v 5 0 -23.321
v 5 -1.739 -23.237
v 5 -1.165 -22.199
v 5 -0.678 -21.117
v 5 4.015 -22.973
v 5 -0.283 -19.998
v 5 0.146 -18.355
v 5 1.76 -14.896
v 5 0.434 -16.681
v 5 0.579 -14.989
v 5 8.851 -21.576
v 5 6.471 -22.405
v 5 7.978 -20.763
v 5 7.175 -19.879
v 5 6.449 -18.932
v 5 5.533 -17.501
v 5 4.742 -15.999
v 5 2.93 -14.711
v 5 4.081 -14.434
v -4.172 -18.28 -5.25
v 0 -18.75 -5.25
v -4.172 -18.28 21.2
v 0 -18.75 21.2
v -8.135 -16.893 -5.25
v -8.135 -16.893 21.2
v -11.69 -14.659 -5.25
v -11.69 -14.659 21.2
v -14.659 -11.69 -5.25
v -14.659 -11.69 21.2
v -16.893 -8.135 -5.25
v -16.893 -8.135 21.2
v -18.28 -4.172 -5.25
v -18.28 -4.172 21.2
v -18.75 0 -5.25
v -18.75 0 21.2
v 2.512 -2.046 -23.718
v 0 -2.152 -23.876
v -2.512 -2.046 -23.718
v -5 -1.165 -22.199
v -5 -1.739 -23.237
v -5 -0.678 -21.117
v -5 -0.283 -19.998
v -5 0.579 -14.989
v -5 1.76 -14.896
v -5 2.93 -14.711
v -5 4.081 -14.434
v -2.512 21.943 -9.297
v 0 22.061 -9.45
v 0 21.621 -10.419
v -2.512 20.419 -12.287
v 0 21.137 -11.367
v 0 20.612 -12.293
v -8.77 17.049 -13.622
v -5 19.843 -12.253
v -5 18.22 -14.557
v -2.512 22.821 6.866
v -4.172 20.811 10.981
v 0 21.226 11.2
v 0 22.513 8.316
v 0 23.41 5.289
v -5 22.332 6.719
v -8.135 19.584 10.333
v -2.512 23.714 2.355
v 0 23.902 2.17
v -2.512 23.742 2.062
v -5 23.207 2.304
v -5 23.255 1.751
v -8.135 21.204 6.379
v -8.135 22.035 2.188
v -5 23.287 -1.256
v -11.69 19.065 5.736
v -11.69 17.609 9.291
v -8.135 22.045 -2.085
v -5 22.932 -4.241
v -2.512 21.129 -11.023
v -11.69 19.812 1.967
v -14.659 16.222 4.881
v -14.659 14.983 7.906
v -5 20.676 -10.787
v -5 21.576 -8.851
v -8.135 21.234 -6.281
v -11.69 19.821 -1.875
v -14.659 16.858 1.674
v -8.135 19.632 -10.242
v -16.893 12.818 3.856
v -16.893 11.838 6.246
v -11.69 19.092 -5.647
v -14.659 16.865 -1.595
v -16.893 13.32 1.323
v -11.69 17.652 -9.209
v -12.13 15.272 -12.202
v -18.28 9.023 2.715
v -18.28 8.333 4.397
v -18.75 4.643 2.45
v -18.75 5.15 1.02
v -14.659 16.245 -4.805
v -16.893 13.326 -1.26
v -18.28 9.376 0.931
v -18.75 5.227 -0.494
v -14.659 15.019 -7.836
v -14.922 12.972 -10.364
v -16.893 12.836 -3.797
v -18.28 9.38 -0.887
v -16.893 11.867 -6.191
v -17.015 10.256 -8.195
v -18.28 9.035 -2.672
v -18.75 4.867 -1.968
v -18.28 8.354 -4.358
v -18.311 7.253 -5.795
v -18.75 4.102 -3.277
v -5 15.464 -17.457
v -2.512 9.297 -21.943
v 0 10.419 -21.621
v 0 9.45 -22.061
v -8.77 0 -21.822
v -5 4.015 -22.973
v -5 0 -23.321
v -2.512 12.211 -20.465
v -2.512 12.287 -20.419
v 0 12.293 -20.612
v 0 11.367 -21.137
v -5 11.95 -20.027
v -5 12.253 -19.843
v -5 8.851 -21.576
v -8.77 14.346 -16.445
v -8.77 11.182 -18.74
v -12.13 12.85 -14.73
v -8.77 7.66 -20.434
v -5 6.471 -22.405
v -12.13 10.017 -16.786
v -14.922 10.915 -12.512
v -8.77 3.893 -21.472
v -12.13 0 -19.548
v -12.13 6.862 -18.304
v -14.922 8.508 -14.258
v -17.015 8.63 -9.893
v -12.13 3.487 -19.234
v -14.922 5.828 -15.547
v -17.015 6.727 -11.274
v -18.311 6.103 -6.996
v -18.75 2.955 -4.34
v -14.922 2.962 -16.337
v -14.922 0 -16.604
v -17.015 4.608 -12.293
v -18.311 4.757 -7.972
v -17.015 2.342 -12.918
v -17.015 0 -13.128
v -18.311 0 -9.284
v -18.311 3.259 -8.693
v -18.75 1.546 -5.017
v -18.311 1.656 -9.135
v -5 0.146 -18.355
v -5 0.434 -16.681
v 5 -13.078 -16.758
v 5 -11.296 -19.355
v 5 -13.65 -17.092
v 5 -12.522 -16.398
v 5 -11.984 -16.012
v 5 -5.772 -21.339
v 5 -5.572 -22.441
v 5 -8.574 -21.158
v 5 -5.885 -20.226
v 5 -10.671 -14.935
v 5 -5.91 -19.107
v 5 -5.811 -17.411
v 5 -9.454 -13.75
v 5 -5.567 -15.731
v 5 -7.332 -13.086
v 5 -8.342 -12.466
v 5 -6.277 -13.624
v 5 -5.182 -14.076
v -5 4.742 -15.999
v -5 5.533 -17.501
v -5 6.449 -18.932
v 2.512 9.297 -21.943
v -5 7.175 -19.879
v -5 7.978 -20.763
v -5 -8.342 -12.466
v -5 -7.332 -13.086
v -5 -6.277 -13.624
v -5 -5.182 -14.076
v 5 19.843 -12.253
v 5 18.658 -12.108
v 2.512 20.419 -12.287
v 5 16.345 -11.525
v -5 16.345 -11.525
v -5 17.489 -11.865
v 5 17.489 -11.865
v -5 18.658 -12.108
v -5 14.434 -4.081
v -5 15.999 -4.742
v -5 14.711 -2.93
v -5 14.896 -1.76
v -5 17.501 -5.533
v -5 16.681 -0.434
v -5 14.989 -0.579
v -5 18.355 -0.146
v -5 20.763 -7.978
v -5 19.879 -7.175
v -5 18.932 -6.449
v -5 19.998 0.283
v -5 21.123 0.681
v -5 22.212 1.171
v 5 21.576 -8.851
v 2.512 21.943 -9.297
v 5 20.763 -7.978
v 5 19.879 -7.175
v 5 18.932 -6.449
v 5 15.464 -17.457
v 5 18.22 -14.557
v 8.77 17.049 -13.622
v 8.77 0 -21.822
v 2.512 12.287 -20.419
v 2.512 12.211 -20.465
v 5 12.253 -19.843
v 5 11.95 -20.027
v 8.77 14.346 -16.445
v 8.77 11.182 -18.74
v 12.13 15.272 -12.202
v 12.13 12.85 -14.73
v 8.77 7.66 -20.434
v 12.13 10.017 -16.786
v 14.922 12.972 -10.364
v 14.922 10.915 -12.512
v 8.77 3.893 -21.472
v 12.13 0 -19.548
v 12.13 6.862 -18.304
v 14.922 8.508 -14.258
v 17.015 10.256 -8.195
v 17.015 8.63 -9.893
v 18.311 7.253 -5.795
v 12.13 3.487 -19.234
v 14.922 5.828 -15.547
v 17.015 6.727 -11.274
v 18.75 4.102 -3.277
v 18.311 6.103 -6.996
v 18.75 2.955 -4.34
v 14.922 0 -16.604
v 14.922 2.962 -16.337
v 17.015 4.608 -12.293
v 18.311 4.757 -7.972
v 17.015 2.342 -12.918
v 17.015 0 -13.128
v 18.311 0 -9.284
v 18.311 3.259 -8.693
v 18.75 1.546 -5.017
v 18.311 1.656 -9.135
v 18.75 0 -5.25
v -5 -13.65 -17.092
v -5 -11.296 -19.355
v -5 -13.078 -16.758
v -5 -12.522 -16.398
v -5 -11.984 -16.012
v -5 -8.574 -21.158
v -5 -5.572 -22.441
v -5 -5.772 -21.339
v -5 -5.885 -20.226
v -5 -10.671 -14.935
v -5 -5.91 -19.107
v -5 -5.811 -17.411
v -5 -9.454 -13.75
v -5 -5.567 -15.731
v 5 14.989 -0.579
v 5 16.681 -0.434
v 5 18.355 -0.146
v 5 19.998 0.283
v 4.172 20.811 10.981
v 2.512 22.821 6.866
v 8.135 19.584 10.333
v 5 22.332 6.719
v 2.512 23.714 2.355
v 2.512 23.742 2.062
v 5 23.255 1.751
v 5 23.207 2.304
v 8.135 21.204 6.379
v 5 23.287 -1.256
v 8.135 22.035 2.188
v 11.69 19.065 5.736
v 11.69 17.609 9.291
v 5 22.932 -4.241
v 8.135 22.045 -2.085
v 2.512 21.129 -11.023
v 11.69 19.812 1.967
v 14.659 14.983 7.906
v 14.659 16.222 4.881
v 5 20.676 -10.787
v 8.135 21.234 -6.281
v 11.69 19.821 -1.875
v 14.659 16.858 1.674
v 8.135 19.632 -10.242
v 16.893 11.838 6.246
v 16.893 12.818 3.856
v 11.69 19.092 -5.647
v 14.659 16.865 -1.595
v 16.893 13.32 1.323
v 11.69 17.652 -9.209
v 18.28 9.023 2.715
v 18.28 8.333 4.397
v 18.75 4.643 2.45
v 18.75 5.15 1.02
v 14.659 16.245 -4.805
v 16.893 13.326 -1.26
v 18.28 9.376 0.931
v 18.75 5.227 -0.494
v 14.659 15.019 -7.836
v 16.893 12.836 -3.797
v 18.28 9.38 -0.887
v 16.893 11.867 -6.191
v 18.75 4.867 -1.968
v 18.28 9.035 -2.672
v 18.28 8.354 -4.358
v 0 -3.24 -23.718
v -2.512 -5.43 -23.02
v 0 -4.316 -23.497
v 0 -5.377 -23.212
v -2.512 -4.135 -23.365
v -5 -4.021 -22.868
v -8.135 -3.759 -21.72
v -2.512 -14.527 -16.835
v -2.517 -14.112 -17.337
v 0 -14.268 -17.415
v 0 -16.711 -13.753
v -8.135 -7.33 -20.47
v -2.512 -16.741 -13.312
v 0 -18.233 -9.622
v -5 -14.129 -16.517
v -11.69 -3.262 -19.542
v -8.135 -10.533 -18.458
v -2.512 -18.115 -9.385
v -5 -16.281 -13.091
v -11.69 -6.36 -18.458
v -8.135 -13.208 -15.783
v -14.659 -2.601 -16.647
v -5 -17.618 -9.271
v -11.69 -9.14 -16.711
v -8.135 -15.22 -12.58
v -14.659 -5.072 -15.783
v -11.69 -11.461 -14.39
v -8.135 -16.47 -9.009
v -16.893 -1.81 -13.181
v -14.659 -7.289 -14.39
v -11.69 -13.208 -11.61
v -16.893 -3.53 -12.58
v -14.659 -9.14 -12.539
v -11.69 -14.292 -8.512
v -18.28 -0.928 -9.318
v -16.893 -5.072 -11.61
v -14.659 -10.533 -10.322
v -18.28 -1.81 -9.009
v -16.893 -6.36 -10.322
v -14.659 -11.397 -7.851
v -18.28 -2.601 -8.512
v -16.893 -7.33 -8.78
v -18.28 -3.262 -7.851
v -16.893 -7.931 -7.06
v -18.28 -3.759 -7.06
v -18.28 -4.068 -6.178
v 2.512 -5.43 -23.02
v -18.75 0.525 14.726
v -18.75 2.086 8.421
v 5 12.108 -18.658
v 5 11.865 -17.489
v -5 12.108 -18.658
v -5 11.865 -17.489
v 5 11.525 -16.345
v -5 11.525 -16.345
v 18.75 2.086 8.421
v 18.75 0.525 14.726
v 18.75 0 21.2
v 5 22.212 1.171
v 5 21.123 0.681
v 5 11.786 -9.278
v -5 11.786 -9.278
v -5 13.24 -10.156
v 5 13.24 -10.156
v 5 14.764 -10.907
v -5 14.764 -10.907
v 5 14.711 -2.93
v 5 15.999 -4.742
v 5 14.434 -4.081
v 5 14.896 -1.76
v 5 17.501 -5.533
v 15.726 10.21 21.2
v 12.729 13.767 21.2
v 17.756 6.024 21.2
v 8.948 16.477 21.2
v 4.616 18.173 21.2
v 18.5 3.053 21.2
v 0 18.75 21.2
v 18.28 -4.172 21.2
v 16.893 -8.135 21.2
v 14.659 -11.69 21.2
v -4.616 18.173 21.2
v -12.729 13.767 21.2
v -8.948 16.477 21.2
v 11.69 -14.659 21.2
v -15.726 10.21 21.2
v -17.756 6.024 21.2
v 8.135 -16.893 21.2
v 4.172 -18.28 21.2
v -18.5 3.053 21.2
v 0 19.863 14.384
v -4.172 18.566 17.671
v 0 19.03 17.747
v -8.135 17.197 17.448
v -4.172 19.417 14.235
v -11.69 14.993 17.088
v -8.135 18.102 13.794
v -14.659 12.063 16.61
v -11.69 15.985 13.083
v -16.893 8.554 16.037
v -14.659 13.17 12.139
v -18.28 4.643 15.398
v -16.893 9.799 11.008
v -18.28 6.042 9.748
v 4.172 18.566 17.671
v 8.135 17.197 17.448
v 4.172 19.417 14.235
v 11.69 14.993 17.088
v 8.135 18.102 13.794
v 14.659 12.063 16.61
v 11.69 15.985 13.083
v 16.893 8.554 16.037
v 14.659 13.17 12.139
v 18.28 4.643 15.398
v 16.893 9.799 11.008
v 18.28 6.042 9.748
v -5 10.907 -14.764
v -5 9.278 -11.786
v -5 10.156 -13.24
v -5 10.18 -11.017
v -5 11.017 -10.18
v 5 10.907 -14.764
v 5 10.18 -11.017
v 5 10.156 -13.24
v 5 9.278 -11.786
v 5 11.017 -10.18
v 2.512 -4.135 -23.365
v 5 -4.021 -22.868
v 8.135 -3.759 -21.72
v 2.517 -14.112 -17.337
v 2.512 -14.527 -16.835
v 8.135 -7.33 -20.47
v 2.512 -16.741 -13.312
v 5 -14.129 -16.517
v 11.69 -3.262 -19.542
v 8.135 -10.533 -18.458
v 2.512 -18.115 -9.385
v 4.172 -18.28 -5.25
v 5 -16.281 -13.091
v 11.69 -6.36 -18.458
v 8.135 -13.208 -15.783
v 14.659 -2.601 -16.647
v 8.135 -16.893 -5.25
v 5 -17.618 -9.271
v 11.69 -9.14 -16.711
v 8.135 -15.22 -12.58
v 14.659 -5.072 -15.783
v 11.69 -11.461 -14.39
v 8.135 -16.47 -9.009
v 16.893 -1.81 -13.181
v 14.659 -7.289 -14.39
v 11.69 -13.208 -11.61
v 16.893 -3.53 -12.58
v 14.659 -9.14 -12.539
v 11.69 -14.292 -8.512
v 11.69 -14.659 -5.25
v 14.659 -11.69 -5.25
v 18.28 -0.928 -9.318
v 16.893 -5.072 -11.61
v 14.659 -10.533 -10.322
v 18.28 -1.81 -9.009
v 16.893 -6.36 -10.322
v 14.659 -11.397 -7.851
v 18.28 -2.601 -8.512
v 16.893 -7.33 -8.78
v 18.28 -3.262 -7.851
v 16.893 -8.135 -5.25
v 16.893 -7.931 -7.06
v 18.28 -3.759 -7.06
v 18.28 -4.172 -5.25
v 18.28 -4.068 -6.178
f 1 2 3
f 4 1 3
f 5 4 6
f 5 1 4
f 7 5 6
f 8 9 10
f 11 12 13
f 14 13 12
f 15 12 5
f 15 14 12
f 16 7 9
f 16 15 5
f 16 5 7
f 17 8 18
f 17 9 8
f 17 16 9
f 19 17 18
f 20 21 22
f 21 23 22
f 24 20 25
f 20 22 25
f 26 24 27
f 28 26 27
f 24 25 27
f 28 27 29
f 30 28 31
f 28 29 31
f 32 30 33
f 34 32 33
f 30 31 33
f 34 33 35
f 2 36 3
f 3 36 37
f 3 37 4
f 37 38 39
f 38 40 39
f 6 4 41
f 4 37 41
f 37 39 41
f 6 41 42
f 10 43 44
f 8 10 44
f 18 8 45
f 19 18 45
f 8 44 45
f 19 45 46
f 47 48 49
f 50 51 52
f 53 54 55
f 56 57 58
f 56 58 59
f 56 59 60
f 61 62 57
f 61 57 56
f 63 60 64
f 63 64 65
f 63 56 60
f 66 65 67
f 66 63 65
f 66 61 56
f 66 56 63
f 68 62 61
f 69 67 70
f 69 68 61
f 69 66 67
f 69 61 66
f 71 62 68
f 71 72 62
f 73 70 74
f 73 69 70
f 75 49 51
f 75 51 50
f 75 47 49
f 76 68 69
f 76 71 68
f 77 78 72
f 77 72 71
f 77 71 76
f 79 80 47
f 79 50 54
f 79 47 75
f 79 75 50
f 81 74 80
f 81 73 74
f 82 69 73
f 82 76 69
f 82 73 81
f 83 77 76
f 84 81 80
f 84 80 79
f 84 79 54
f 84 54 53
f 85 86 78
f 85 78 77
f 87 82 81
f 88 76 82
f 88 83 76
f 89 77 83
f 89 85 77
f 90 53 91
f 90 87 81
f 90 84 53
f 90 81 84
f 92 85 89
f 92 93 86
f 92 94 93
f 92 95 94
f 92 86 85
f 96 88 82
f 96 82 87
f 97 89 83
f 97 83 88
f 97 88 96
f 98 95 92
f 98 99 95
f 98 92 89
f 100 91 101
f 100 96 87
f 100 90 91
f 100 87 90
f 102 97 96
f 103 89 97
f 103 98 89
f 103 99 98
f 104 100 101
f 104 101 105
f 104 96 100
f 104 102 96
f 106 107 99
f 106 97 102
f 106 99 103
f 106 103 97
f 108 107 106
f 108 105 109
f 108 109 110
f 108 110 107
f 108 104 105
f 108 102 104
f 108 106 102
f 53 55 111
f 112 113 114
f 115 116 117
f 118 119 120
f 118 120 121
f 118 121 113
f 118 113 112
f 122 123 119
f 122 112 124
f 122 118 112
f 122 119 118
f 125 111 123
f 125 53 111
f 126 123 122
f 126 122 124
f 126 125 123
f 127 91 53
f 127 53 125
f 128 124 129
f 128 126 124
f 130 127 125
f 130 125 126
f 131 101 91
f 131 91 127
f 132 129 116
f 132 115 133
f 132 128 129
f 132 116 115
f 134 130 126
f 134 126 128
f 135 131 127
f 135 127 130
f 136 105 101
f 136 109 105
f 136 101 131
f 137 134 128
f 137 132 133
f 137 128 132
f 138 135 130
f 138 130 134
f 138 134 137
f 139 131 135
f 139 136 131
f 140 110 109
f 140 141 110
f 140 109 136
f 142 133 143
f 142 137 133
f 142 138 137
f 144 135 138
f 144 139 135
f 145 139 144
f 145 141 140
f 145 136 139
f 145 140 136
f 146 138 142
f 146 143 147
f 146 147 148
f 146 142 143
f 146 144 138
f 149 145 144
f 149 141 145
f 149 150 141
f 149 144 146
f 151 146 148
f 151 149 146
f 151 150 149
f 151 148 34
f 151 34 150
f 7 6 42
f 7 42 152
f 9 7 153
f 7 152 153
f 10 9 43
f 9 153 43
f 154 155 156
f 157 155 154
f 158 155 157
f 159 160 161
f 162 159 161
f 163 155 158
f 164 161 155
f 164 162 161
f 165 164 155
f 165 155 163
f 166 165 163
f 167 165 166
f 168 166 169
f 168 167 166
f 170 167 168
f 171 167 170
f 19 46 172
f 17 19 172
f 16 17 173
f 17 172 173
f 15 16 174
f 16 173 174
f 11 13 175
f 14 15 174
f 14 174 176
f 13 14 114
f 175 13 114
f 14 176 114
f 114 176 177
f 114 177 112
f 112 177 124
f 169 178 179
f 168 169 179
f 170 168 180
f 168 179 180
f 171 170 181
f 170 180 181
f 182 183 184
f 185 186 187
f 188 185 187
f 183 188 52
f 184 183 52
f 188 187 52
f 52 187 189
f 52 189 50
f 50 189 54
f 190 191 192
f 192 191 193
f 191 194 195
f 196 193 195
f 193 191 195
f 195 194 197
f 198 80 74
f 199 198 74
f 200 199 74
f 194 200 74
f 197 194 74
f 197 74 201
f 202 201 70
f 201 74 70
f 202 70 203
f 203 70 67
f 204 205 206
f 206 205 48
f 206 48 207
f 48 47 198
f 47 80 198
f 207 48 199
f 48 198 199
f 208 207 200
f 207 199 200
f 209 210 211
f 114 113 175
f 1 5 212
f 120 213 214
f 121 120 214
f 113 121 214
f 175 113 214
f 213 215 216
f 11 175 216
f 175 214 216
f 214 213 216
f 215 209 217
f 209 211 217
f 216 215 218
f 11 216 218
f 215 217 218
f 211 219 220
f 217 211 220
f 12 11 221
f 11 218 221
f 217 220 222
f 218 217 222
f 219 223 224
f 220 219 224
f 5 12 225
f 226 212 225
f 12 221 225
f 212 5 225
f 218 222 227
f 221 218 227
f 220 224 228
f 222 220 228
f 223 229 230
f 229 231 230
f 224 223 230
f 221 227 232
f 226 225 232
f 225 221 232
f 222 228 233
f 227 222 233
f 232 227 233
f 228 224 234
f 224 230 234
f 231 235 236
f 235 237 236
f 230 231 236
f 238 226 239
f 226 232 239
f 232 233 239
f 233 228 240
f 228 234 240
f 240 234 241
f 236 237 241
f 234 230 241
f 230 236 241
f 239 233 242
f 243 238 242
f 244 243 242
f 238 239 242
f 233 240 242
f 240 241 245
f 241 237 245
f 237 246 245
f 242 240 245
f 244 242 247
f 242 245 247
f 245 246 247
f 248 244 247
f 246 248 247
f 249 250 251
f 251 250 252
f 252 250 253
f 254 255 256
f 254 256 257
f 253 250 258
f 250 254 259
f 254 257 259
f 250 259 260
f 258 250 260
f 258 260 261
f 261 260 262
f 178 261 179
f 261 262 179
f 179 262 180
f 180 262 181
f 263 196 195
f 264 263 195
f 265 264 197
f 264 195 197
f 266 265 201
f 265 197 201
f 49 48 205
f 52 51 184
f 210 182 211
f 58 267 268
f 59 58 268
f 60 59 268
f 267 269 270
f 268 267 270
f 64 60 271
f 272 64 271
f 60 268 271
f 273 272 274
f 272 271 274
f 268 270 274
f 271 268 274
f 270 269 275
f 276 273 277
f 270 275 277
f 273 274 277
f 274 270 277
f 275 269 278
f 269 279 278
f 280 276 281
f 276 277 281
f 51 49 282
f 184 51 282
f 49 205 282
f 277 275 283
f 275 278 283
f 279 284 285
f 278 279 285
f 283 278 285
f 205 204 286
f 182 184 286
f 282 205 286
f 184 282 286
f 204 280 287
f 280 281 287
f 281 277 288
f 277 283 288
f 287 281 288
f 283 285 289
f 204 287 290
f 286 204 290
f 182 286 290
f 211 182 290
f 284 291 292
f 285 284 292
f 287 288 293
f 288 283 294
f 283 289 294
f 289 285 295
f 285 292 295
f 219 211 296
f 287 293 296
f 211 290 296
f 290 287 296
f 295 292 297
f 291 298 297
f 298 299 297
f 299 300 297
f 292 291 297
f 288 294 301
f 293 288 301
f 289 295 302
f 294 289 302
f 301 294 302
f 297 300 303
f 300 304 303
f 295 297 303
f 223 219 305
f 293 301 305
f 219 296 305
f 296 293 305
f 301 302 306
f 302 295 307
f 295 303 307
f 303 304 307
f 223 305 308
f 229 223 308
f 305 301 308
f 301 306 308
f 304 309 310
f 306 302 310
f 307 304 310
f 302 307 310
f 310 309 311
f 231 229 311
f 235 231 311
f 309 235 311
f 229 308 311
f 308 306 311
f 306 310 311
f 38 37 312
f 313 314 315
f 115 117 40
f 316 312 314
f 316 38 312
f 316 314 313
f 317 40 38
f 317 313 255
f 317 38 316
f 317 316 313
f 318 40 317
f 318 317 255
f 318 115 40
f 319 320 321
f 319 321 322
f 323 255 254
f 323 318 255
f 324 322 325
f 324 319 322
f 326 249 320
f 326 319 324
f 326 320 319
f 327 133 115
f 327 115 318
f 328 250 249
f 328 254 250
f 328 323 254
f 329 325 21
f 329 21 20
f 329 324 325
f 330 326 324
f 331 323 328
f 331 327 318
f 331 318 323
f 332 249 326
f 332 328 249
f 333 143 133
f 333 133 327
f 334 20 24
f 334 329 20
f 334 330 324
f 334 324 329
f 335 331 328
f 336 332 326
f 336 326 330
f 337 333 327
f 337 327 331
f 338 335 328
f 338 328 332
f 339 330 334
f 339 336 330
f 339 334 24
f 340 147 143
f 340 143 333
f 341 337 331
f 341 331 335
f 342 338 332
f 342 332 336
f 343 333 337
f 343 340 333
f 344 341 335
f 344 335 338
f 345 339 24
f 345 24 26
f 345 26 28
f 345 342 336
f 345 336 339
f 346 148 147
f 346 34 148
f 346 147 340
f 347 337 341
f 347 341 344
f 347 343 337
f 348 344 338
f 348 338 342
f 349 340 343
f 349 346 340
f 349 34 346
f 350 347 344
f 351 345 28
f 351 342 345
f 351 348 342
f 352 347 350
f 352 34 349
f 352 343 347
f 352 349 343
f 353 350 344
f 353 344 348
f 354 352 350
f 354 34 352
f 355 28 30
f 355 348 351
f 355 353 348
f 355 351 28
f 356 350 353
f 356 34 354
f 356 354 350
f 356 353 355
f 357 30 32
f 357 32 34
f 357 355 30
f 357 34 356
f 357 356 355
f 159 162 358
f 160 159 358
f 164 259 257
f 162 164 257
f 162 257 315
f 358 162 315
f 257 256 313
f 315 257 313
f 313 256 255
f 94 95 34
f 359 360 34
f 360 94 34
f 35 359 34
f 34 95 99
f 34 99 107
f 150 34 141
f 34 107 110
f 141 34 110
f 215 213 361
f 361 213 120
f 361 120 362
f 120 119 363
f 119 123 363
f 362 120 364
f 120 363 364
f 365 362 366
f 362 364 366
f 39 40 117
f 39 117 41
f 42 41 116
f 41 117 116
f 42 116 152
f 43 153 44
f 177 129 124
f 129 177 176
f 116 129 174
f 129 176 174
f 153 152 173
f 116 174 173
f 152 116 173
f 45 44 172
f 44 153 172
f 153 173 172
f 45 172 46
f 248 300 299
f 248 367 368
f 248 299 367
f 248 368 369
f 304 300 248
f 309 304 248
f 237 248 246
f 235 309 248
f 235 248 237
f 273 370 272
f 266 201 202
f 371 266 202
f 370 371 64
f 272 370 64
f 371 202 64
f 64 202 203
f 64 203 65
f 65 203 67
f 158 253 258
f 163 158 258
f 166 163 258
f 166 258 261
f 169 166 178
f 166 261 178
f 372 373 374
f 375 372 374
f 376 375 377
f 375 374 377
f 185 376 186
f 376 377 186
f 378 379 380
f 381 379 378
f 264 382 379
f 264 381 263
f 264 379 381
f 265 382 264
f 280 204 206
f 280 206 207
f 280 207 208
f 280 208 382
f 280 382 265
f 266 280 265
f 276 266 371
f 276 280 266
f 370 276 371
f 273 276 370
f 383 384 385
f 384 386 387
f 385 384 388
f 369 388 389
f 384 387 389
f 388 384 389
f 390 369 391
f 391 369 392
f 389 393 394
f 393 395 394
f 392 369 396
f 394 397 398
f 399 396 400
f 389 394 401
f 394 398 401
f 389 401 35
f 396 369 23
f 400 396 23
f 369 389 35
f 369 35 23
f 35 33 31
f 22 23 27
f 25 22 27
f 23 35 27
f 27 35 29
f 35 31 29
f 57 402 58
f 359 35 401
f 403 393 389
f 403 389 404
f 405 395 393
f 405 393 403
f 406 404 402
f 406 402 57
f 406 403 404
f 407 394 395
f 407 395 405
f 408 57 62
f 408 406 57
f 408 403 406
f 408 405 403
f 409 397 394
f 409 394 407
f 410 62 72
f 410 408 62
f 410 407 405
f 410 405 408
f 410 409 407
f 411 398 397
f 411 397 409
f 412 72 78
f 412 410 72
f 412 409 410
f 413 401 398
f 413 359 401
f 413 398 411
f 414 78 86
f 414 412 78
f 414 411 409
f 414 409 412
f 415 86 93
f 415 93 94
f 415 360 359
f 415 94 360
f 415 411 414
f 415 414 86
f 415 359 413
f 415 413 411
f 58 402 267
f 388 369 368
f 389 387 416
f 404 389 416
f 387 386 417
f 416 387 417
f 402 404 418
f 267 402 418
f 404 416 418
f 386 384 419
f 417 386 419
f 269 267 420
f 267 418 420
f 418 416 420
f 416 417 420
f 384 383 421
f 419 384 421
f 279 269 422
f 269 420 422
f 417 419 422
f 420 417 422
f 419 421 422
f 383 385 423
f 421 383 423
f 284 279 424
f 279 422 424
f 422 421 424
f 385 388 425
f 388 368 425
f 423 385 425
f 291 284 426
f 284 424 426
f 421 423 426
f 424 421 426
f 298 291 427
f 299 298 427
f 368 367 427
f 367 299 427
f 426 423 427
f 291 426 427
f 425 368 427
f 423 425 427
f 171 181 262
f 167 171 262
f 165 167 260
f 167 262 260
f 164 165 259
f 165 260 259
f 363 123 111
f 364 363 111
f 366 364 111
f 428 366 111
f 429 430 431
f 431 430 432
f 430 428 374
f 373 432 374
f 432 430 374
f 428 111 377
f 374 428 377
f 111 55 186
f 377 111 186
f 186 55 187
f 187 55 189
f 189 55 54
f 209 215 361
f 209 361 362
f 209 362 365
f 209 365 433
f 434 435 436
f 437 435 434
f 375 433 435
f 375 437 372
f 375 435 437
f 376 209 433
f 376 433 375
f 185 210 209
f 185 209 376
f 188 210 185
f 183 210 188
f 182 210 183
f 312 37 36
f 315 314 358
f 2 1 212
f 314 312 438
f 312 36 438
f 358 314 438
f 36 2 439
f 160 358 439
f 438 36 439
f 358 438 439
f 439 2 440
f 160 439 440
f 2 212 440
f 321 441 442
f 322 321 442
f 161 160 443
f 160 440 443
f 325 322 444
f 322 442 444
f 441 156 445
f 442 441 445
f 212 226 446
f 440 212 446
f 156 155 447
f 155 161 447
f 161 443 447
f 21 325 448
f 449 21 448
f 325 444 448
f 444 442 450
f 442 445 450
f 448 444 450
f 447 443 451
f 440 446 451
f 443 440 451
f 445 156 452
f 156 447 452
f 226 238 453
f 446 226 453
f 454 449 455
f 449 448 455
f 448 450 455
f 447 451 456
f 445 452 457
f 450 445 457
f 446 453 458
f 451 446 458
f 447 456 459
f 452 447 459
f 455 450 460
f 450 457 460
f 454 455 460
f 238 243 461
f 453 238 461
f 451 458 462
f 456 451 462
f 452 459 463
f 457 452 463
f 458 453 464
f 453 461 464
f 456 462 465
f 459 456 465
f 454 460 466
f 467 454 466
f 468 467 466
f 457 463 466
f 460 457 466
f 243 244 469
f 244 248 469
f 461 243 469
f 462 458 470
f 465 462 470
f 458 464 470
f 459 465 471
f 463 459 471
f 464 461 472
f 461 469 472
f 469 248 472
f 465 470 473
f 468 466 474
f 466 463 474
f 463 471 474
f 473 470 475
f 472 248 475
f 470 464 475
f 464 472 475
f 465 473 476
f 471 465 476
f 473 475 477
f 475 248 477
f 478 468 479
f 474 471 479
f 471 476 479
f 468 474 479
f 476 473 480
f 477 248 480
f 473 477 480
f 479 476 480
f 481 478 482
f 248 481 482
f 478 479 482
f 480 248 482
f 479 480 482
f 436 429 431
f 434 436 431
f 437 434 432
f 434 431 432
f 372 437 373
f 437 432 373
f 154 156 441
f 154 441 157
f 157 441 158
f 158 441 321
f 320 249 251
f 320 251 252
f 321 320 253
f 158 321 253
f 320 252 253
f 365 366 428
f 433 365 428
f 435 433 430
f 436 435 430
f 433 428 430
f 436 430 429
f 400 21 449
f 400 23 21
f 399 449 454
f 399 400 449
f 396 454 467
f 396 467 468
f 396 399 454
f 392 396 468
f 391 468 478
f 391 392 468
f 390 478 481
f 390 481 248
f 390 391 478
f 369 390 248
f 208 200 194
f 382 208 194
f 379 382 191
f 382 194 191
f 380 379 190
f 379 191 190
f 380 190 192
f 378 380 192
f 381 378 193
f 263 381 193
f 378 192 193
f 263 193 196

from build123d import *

# Parameters (mm, degrees)
BOSS_EXTRUDE1_DEPTH      = 18.75
BOSS_EXTRUDE1_DEPTH_BACK = 18.75
FILLET1_R                = 18.75
CUT_EXTRUDE1_DEPTH       = 5
CUT_EXTRUDE1_DEPTH_BACK  = 5


with BuildPart() as part:
    # Sketch1 → Boss-Extrude1 (new, two sides: drawn at the far end of the back side and taken through both)
    with BuildSketch(Plane(origin=(0, 0, 0), x_dir=(0, 0, -1), z_dir=(1, 0, 0)).offset(-BOSS_EXTRUDE1_DEPTH_BACK)):
        with BuildLine():
            Line((-21.199959993, 18.75), (-21.199959993, 0))
            Line((-21.199959993, 0), (24, 0))
            ThreePointArc((24, 0), (21.628103458, 10.403131298), (14.981238267, 18.75))
            Line((14.981238267, 18.75), (-21.199959993, 18.75))
        make_face()
        with BuildLine():
            ThreePointArc((-11.199959993, 21.226419768), (-16.048924785, 19.37831648), (-21.199959993, 18.75))
            Line((-21.199959993, 18.75), (14.981238267, 18.75))
            ThreePointArc((14.981238267, 18.75), (2.260017713, 23.893353049), (-11.199959993, 21.226419768))
        make_face()
        with BuildLine():
            ThreePointArc((24, 0), (18.508252147, -13.258252147), (5.25, -18.75))
            Line((5.25, -18.75), (-21.199959993, -18.75))
            Line((-21.199959993, -18.75), (-21.199959993, 0))
            Line((-21.199959993, 0), (24, 0))
        make_face()
    extrude(amount=BOSS_EXTRUDE1_DEPTH + BOSS_EXTRUDE1_DEPTH_BACK)

    # Fillet1
    fillet1_edges = [part.edges().sort_by_distance(p)[0] for p in [
        (18.75, -18.75, 7.974979997),
        (-18.75, -18.75, 7.974979997),
        (18.75, -13.258252147, -18.508252147),
        (-18.75, -13.258252147, -18.508252147),
        (18.75, 20.552360446, -12.393566076),
        (-18.75, 20.552360446, -12.393566076),
        (18.75, 19.37831648, 16.048924785),
        (-18.75, 19.37831648, 16.048924785),
    ]]
    fillet(fillet1_edges, radius=FILLET1_R - 0.0001)  # a hair under: the kernel refuses the full size

    # Sketch2 → Cut-Extrude1 (cut, two sides: drawn at the far end of the back side and taken through both)
    with BuildSketch(Plane(origin=(0, 0, 0), x_dir=(0, 0, -1), z_dir=(1, 0, 0)).offset(-CUT_EXTRUDE1_DEPTH_BACK)):
        with BuildLine():
            ThreePointArc((6.449036598, 18.931717486), (5.121740793, 16.758420159), (4.08141286, 14.434059341))
            ThreePointArc((4.08141286, 14.434059341), (2.346516976, 14.815325109), (0.578715338, 14.988832128))
            ThreePointArc((0.578715338, 14.988832128), (0.307571672, 17.520909641), (-0.283175845, 19.997995186))
            ThreePointArc((-0.283175845, 19.997995186), (-1.077578354, 22.021879435), (-2.170046216, 23.901692397))
            ThreePointArc((-2.170046216, 23.901692397), (52.177632289, 26.585831545), (18.061354181, -15.804666563))
            ThreePointArc((18.061354181, -15.804666563), (17.182690047, -13.815915161), (16.012271373, -11.983620717))
            ThreePointArc((16.012271373, -11.983620717), (14.35549975, -10.049701585), (12.466380259, -8.34202393))
            ThreePointArc((12.466380259, -8.34202393), (13.365097847, -6.809857488), (14.076393592, -5.182194847))
            ThreePointArc((14.076393592, -5.182194847), (16.568330412, -5.706776879), (19.106729783, -5.910404133))
            ThreePointArc((19.106729783, -5.910404133), (21.277041962, -5.780297079), (23.402441464, -5.322192551))
            ThreePointArc((23.402441464, -5.322192551), (23.704520174, -3.754427161), (23.901692397, -2.170046216))
            ThreePointArc((23.901692397, -2.170046216), (22.021879435, -1.077578354), (19.997995186, -0.283175845))
            ThreePointArc((19.997995186, -0.283175845), (17.520909641, 0.307571672), (14.988832128, 0.578715338))
            ThreePointArc((14.988832128, 0.578715338), (14.815325109, 2.346516975), (14.434059341, 4.08141286))
            ThreePointArc((14.434059341, 4.08141286), (16.75842016, 5.121740793), (18.931717486, 6.449036598))
            ThreePointArc((18.931717486, 6.449036598), (20.611061914, 7.829972908), (22.061279145, 9.449865739))
            ThreePointArc((22.061279145, 9.449865739), (21.384156581, 10.895771994), (20.612396506, 12.293458028))
            ThreePointArc((20.612396506, 12.293458028), (18.449459375, 12.072356759), (16.345164544, 11.525432574))
            ThreePointArc((16.345164544, 11.525432574), (13.993927564, 10.547363003), (11.786059576, 9.278405017))
            ThreePointArc((11.786059576, 9.278405017), (10.606601718, 10.606601718), (9.278405018, 11.786059576))
            ThreePointArc((9.278405018, 11.786059576), (10.547363004, 13.993927564), (11.525432575, 16.345164544))
            ThreePointArc((11.525432575, 16.345164544), (12.072356759, 18.449459375), (12.293458029, 20.612396506))
            ThreePointArc((12.293458029, 20.612396506), (10.895771994, 21.384156581), (9.449865739, 22.061279145))
            ThreePointArc((9.449865739, 22.061279145), (7.829972908, 20.611061914), (6.449036598, 18.931717486))
        make_face()
    extrude(amount=CUT_EXTRUDE1_DEPTH + CUT_EXTRUDE1_DEPTH_BACK, mode=Mode.SUBTRACT)


solid = part.part
